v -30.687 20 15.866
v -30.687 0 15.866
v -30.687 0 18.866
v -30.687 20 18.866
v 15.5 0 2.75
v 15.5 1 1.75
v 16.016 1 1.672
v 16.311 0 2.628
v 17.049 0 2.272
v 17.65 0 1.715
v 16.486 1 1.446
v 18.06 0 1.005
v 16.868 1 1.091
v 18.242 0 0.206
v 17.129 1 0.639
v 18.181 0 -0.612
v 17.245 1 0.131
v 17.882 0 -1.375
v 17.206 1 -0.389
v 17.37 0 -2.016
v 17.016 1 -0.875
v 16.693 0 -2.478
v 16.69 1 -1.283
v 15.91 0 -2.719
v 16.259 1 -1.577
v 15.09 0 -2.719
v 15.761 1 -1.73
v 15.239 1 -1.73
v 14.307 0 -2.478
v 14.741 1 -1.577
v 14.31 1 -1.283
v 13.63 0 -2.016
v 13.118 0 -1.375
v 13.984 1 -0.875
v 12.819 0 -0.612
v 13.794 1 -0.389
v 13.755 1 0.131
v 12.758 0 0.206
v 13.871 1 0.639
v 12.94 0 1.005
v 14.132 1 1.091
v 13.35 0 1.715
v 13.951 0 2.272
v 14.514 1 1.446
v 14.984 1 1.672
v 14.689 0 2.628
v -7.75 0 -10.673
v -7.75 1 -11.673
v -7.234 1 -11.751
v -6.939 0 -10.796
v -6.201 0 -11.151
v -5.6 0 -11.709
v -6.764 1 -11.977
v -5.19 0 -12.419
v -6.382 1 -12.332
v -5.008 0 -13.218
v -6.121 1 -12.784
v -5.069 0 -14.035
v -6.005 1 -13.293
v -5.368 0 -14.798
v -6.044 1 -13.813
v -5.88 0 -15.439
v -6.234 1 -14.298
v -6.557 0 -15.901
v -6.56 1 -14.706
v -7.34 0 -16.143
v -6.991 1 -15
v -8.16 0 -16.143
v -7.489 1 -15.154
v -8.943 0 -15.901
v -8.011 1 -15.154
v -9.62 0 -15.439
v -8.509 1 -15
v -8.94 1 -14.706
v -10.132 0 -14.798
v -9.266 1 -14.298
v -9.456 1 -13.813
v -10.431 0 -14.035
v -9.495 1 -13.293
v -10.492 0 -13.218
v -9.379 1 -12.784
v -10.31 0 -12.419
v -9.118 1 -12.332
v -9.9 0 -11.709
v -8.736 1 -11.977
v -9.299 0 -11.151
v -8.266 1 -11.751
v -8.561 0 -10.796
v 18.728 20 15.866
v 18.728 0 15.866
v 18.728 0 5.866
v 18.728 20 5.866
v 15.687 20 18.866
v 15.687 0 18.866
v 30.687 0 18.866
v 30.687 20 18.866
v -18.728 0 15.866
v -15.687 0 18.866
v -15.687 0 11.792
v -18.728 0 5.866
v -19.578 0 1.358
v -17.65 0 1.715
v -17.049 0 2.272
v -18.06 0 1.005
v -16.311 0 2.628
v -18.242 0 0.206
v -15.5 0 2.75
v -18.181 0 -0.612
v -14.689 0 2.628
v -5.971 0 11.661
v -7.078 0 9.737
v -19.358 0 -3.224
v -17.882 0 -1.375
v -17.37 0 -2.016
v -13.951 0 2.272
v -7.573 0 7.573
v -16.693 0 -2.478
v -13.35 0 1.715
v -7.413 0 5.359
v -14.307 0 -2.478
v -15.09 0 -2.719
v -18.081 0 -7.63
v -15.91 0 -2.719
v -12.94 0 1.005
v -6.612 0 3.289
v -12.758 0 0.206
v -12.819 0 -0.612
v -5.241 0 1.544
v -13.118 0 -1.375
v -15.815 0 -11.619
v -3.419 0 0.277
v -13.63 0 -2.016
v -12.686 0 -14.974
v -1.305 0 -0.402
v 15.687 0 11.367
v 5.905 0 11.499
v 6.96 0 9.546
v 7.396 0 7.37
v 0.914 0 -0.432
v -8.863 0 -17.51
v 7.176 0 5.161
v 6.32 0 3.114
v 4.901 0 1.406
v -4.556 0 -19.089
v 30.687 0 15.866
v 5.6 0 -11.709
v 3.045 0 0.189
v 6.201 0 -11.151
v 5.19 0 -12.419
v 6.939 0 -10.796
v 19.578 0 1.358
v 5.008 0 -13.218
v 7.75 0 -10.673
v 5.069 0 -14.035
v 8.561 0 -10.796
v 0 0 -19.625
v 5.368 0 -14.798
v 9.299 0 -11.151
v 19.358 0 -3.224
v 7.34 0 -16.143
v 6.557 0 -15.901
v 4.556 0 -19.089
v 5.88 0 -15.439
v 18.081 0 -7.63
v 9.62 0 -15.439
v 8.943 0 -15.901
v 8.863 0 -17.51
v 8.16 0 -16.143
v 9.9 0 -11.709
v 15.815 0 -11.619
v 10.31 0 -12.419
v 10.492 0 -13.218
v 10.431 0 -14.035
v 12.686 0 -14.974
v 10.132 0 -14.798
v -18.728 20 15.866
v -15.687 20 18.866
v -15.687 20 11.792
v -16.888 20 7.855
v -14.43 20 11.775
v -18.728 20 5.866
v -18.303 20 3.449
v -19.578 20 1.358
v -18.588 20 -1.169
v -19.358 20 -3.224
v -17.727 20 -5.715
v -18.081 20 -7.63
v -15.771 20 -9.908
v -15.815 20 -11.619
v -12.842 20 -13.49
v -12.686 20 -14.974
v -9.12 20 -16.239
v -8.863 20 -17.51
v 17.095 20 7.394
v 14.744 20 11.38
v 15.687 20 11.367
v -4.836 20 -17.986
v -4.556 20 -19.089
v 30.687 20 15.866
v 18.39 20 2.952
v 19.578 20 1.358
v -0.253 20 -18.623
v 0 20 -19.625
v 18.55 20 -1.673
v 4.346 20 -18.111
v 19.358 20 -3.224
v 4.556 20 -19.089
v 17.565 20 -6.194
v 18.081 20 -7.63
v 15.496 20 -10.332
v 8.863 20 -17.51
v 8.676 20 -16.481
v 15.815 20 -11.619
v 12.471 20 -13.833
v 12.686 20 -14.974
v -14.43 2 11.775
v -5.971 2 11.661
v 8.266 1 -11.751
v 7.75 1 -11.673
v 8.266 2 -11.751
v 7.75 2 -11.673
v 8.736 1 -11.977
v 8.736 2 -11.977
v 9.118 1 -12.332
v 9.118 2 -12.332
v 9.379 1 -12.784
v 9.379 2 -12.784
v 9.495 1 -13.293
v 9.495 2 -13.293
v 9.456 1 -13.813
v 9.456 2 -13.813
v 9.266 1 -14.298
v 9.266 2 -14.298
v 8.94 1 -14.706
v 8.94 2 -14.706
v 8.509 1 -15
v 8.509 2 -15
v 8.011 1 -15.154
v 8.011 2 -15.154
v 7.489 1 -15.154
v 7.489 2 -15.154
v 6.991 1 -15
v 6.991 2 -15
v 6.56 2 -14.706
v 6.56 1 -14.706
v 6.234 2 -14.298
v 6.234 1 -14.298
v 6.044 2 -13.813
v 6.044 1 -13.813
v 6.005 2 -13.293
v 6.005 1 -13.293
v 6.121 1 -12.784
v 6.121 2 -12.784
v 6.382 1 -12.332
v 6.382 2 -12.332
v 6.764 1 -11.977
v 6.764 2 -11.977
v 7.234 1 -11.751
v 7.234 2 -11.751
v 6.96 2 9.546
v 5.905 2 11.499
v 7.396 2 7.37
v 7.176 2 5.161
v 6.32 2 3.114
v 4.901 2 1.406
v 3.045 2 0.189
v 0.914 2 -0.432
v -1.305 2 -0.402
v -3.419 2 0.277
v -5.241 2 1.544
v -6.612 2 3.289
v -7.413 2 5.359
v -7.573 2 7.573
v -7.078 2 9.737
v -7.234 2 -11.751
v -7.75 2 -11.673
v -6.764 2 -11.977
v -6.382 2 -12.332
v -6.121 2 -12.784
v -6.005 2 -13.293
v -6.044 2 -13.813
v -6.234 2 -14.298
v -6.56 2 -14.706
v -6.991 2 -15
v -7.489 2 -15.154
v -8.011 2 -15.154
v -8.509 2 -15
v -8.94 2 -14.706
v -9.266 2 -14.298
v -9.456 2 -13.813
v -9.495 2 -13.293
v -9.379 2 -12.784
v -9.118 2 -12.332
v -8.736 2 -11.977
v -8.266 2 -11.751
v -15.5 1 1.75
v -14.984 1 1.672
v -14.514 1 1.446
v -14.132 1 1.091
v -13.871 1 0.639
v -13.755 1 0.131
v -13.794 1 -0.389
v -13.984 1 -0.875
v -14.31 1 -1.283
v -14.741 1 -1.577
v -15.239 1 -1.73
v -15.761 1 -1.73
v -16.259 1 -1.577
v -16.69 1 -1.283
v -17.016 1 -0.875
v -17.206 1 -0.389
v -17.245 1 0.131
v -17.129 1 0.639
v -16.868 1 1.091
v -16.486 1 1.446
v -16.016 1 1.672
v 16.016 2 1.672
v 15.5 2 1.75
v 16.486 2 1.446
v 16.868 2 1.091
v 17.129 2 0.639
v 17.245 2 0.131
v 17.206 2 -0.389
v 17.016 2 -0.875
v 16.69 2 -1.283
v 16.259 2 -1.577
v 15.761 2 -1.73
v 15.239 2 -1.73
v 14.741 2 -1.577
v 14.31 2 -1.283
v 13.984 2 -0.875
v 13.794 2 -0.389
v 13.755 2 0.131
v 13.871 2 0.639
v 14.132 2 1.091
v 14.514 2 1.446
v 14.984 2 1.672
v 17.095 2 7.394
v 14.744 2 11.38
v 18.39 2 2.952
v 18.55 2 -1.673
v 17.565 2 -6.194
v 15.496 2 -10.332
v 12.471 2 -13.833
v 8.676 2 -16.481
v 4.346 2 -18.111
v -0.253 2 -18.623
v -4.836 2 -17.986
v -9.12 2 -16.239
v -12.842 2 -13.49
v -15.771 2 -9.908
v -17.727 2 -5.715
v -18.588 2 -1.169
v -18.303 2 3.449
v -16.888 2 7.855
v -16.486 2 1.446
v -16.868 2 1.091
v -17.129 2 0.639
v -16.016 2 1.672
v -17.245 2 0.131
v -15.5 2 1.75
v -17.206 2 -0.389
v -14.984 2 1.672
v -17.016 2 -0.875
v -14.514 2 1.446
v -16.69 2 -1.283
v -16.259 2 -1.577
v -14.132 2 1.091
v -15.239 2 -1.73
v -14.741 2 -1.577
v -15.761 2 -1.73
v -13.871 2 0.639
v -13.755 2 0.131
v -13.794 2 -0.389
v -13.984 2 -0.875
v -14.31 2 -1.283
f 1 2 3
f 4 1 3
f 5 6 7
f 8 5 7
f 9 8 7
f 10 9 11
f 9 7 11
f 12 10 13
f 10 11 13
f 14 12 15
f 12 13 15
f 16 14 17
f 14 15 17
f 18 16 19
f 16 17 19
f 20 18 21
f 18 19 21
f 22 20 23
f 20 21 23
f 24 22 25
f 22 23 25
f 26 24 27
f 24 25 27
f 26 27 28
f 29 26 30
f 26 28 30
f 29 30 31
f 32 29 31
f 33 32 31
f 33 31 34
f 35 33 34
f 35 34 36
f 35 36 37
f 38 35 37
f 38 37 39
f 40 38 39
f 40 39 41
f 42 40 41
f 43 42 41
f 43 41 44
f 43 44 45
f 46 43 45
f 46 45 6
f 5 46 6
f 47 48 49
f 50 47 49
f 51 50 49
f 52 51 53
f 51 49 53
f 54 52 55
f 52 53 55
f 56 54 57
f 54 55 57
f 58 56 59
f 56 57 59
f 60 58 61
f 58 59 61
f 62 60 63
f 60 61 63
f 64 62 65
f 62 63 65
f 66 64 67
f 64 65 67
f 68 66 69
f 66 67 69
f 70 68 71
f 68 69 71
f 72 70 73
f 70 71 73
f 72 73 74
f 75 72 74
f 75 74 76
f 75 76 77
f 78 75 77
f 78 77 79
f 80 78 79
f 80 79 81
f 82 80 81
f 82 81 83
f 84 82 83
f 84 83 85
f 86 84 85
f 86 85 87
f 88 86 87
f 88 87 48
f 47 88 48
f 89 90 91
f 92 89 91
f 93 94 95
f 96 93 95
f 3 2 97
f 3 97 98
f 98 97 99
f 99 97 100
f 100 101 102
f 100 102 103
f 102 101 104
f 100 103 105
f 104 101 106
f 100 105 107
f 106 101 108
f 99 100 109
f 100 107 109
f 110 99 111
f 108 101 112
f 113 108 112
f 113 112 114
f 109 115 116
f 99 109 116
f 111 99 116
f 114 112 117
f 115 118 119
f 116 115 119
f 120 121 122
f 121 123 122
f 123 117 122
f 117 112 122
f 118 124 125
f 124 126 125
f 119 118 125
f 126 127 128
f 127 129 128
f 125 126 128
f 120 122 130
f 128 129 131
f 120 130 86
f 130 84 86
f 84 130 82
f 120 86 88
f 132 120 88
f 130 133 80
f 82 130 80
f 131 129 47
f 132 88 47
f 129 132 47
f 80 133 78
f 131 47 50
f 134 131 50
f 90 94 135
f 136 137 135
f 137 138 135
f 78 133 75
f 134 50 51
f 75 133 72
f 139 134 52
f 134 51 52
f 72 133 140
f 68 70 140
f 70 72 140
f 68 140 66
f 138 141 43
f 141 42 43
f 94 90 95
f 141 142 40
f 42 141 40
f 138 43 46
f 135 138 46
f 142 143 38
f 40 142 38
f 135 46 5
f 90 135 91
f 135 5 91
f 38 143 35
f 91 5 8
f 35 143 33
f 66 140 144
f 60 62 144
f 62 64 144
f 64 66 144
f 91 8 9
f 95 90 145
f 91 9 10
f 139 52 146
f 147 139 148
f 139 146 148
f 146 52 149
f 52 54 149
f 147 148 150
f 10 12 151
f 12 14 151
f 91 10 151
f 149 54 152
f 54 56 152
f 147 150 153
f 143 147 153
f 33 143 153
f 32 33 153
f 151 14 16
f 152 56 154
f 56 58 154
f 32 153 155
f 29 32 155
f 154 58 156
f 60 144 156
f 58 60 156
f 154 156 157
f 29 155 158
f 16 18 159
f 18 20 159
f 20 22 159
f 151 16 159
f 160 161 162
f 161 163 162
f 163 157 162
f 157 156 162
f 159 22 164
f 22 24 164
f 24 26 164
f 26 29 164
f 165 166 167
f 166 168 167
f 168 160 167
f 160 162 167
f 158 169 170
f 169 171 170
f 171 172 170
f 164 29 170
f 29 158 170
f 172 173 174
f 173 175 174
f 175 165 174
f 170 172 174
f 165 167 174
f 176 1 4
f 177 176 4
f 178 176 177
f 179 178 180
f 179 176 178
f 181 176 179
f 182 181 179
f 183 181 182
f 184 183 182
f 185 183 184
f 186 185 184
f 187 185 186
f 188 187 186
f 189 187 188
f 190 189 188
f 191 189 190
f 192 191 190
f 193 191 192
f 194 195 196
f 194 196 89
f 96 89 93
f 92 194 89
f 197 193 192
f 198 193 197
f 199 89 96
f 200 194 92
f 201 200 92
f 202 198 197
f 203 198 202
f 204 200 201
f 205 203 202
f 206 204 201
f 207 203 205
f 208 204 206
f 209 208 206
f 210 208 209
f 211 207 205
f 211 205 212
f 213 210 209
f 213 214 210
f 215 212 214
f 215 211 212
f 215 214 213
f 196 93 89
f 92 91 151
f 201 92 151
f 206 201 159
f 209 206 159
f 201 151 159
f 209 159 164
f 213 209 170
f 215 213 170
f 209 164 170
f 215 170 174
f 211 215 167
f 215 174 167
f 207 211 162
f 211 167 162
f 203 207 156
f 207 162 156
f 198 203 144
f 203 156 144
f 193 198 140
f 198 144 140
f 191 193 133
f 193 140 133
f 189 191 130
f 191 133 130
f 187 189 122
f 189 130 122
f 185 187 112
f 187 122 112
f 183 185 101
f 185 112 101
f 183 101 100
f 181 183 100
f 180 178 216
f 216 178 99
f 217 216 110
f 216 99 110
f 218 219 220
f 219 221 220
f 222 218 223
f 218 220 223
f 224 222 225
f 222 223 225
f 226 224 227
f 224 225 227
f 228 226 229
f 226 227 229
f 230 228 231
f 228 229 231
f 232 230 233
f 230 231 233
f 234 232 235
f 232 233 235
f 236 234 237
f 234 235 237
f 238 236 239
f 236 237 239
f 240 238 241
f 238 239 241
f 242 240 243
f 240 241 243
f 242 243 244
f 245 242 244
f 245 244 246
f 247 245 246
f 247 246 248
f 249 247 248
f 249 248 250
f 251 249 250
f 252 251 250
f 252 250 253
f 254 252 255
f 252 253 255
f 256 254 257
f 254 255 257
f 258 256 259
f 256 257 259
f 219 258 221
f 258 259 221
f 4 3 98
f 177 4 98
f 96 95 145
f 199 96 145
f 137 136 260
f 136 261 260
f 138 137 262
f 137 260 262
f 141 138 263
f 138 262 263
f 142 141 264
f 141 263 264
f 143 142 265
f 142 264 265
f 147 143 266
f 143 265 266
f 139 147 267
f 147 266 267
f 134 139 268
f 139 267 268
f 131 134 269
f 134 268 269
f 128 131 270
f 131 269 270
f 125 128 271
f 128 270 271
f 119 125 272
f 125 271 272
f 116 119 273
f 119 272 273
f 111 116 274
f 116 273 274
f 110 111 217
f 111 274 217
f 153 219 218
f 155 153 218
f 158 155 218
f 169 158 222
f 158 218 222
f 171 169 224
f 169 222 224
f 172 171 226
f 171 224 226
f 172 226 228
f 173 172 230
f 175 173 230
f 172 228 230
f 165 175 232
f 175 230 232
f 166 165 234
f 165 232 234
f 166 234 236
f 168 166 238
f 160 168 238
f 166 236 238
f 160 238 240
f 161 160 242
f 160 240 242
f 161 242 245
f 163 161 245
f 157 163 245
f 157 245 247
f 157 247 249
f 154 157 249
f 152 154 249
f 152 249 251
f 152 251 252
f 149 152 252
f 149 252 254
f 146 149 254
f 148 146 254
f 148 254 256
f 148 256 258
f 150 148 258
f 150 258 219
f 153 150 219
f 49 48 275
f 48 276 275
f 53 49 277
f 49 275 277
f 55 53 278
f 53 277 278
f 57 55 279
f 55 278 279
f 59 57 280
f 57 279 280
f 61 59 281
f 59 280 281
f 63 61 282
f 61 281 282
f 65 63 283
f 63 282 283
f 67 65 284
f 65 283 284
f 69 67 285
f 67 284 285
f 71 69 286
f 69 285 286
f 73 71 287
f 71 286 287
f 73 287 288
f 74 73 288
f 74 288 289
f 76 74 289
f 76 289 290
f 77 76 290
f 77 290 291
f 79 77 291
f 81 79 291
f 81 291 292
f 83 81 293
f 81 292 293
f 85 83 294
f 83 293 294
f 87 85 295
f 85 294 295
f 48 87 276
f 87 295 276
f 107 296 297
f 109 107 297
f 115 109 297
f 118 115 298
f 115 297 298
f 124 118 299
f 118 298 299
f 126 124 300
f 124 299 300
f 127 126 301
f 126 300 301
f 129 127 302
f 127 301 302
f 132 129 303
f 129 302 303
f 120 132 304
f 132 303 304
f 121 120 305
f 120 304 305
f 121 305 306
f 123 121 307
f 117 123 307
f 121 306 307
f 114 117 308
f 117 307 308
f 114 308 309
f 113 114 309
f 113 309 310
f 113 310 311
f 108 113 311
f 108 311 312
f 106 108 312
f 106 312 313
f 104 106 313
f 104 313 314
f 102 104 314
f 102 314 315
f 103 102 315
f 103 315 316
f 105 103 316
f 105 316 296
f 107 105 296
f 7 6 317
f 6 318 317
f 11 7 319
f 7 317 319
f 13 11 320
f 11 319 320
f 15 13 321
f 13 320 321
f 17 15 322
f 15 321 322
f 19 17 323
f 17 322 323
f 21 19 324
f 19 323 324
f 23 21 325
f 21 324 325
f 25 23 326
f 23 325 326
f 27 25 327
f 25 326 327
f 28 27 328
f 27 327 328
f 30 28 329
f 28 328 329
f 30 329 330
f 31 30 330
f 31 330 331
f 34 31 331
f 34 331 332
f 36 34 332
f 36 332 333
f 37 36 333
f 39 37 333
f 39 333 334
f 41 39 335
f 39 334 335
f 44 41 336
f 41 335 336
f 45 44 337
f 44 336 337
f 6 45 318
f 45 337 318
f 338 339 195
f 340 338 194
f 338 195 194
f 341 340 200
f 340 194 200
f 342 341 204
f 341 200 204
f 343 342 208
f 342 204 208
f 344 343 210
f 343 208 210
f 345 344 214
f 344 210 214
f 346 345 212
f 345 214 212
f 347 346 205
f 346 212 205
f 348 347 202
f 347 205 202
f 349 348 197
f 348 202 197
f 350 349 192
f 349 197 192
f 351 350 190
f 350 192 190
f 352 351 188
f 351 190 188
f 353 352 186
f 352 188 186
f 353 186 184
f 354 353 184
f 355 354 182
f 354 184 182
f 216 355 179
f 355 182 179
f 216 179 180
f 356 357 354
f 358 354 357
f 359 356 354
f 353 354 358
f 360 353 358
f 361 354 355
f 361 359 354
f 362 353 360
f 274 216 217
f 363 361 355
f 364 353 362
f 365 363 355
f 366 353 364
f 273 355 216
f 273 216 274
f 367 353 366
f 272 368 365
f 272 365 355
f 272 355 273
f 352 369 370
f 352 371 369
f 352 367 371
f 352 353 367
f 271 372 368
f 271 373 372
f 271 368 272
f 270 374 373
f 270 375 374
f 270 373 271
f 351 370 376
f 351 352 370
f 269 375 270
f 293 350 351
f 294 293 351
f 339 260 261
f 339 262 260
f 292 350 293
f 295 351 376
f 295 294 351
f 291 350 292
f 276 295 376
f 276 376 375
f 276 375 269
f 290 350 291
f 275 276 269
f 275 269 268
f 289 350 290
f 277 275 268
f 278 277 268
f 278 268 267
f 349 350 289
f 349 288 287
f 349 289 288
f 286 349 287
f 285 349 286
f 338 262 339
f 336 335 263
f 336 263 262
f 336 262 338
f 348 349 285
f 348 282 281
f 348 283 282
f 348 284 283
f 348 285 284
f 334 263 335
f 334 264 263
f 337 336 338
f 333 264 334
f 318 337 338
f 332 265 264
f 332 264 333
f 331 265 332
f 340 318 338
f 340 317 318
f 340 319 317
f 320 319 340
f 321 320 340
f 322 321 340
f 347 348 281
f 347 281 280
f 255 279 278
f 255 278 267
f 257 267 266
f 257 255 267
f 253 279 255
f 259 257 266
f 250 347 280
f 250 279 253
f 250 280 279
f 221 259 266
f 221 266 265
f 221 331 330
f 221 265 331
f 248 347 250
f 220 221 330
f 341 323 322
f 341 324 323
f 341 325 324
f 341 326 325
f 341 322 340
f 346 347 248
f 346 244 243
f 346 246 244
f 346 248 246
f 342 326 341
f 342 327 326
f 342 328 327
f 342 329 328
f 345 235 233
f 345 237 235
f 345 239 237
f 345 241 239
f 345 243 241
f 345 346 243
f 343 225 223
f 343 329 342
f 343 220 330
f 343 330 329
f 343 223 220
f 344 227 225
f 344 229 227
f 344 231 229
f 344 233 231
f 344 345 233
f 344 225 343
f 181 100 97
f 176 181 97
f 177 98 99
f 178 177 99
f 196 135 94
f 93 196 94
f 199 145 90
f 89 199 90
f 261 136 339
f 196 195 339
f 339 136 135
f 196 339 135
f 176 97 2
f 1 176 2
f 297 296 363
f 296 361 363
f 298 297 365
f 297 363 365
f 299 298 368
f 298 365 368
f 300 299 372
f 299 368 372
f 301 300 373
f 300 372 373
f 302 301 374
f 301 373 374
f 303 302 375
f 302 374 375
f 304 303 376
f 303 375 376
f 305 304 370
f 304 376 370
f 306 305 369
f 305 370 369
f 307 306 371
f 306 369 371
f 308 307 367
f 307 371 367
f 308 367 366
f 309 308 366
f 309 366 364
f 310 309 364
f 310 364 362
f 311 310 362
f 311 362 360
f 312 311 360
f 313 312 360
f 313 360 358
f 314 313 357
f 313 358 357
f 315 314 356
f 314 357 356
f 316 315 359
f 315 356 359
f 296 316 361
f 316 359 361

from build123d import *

# Parameters (mm, degrees)
BOSS_EXTRUDE2_DEPTH                                 = 20
SKETCH3_R                                           = 18.625
CUT_EXTRUDE1_DEPTH                                  = 18
SKETCH5_R                                           = 7.5
CUT_EXTRUDE2_DEPTH                                  = 2
CSK_FOR_M3_COUNTERSUNK_FLAT_HEAD_SCREW2_D           = 3.5
CSK_FOR_M3_COUNTERSUNK_FLAT_HEAD_SCREW2_CSINK_D     = 5.5
CSK_FOR_M3_COUNTERSUNK_FLAT_HEAD_SCREW2_CSINK_ANGLE = 90


with BuildPart() as part:
    # Sketch1 → Boss-Extrude2 (new body)
    with BuildSketch(Plane(origin=(0, 0, 0), x_dir=(1, 0, 0), z_dir=(0, 1, 0))):
        with BuildLine():
            Line((-18.727852322, -5.86584797), (-18.727852322, -15.86584797))
            Line((-18.727852322, -15.86584797), (-30.687012052, -15.86584797))
            Line((-30.687012052, -15.86584797), (-30.687012052, -18.86584797))
            Line((-30.687012052, -18.86584797), (-15.687012052, -18.86584797))
            Line((-15.687012052, -18.86584797), (-15.687012052, -11.792297397))
            Line((-15.687012052, -11.792297397), (15.687012052, -11.366724546))
            Line((15.687012052, -11.366724546), (15.687012052, -18.86584797))
            Line((15.687012052, -18.86584797), (30.687012052, -18.86584797))
            Line((30.687012052, -18.86584797), (30.687012052, -15.86584797))
            Line((30.687012052, -15.86584797), (18.727852322, -15.86584797))
            Line((18.727852322, -15.86584797), (18.727852322, -5.86584797))
            ThreePointArc((18.727852322, -5.86584797), (0, 19.625), (-18.727852322, -5.86584797))
        make_face()
    extrude(amount=BOSS_EXTRUDE2_DEPTH)

    # Sketch3 → Cut-Extrude1 (cut)
    with BuildSketch(Plane(origin=(0, 20, 0), x_dir=(1, 0, 0), z_dir=(0, 1, 0))):
        Circle(SKETCH3_R)
    extrude(amount=-CUT_EXTRUDE1_DEPTH, mode=Mode.SUBTRACT)

    # Sketch5 → Cut-Extrude2 (cut)
    with BuildSketch(Plane(origin=(0, 2, 0), x_dir=(1, 0, 0), z_dir=(0, 1, 0))):
        with Locations((-0.094951478, -7)):
            Circle(SKETCH5_R)
    extrude(amount=-CUT_EXTRUDE2_DEPTH, mode=Mode.SUBTRACT)

    # CSK for M3 Countersunk Flat Head Screw2 (through all)
    with Locations(Plane(origin=(7.75, 0, -13.423393759), x_dir=(0, 0, -1), z_dir=(0, -1, 0))):
        with Locations((0, 0), (0, -15.5), (-13.423393759, -23.25), (-13.423393759, 7.75)):
            CounterSinkHole(CSK_FOR_M3_COUNTERSUNK_FLAT_HEAD_SCREW2_D / 2, CSK_FOR_M3_COUNTERSUNK_FLAT_HEAD_SCREW2_CSINK_D / 2, counter_sink_angle=CSK_FOR_M3_COUNTERSUNK_FLAT_HEAD_SCREW2_CSINK_ANGLE)


solid = part.part
